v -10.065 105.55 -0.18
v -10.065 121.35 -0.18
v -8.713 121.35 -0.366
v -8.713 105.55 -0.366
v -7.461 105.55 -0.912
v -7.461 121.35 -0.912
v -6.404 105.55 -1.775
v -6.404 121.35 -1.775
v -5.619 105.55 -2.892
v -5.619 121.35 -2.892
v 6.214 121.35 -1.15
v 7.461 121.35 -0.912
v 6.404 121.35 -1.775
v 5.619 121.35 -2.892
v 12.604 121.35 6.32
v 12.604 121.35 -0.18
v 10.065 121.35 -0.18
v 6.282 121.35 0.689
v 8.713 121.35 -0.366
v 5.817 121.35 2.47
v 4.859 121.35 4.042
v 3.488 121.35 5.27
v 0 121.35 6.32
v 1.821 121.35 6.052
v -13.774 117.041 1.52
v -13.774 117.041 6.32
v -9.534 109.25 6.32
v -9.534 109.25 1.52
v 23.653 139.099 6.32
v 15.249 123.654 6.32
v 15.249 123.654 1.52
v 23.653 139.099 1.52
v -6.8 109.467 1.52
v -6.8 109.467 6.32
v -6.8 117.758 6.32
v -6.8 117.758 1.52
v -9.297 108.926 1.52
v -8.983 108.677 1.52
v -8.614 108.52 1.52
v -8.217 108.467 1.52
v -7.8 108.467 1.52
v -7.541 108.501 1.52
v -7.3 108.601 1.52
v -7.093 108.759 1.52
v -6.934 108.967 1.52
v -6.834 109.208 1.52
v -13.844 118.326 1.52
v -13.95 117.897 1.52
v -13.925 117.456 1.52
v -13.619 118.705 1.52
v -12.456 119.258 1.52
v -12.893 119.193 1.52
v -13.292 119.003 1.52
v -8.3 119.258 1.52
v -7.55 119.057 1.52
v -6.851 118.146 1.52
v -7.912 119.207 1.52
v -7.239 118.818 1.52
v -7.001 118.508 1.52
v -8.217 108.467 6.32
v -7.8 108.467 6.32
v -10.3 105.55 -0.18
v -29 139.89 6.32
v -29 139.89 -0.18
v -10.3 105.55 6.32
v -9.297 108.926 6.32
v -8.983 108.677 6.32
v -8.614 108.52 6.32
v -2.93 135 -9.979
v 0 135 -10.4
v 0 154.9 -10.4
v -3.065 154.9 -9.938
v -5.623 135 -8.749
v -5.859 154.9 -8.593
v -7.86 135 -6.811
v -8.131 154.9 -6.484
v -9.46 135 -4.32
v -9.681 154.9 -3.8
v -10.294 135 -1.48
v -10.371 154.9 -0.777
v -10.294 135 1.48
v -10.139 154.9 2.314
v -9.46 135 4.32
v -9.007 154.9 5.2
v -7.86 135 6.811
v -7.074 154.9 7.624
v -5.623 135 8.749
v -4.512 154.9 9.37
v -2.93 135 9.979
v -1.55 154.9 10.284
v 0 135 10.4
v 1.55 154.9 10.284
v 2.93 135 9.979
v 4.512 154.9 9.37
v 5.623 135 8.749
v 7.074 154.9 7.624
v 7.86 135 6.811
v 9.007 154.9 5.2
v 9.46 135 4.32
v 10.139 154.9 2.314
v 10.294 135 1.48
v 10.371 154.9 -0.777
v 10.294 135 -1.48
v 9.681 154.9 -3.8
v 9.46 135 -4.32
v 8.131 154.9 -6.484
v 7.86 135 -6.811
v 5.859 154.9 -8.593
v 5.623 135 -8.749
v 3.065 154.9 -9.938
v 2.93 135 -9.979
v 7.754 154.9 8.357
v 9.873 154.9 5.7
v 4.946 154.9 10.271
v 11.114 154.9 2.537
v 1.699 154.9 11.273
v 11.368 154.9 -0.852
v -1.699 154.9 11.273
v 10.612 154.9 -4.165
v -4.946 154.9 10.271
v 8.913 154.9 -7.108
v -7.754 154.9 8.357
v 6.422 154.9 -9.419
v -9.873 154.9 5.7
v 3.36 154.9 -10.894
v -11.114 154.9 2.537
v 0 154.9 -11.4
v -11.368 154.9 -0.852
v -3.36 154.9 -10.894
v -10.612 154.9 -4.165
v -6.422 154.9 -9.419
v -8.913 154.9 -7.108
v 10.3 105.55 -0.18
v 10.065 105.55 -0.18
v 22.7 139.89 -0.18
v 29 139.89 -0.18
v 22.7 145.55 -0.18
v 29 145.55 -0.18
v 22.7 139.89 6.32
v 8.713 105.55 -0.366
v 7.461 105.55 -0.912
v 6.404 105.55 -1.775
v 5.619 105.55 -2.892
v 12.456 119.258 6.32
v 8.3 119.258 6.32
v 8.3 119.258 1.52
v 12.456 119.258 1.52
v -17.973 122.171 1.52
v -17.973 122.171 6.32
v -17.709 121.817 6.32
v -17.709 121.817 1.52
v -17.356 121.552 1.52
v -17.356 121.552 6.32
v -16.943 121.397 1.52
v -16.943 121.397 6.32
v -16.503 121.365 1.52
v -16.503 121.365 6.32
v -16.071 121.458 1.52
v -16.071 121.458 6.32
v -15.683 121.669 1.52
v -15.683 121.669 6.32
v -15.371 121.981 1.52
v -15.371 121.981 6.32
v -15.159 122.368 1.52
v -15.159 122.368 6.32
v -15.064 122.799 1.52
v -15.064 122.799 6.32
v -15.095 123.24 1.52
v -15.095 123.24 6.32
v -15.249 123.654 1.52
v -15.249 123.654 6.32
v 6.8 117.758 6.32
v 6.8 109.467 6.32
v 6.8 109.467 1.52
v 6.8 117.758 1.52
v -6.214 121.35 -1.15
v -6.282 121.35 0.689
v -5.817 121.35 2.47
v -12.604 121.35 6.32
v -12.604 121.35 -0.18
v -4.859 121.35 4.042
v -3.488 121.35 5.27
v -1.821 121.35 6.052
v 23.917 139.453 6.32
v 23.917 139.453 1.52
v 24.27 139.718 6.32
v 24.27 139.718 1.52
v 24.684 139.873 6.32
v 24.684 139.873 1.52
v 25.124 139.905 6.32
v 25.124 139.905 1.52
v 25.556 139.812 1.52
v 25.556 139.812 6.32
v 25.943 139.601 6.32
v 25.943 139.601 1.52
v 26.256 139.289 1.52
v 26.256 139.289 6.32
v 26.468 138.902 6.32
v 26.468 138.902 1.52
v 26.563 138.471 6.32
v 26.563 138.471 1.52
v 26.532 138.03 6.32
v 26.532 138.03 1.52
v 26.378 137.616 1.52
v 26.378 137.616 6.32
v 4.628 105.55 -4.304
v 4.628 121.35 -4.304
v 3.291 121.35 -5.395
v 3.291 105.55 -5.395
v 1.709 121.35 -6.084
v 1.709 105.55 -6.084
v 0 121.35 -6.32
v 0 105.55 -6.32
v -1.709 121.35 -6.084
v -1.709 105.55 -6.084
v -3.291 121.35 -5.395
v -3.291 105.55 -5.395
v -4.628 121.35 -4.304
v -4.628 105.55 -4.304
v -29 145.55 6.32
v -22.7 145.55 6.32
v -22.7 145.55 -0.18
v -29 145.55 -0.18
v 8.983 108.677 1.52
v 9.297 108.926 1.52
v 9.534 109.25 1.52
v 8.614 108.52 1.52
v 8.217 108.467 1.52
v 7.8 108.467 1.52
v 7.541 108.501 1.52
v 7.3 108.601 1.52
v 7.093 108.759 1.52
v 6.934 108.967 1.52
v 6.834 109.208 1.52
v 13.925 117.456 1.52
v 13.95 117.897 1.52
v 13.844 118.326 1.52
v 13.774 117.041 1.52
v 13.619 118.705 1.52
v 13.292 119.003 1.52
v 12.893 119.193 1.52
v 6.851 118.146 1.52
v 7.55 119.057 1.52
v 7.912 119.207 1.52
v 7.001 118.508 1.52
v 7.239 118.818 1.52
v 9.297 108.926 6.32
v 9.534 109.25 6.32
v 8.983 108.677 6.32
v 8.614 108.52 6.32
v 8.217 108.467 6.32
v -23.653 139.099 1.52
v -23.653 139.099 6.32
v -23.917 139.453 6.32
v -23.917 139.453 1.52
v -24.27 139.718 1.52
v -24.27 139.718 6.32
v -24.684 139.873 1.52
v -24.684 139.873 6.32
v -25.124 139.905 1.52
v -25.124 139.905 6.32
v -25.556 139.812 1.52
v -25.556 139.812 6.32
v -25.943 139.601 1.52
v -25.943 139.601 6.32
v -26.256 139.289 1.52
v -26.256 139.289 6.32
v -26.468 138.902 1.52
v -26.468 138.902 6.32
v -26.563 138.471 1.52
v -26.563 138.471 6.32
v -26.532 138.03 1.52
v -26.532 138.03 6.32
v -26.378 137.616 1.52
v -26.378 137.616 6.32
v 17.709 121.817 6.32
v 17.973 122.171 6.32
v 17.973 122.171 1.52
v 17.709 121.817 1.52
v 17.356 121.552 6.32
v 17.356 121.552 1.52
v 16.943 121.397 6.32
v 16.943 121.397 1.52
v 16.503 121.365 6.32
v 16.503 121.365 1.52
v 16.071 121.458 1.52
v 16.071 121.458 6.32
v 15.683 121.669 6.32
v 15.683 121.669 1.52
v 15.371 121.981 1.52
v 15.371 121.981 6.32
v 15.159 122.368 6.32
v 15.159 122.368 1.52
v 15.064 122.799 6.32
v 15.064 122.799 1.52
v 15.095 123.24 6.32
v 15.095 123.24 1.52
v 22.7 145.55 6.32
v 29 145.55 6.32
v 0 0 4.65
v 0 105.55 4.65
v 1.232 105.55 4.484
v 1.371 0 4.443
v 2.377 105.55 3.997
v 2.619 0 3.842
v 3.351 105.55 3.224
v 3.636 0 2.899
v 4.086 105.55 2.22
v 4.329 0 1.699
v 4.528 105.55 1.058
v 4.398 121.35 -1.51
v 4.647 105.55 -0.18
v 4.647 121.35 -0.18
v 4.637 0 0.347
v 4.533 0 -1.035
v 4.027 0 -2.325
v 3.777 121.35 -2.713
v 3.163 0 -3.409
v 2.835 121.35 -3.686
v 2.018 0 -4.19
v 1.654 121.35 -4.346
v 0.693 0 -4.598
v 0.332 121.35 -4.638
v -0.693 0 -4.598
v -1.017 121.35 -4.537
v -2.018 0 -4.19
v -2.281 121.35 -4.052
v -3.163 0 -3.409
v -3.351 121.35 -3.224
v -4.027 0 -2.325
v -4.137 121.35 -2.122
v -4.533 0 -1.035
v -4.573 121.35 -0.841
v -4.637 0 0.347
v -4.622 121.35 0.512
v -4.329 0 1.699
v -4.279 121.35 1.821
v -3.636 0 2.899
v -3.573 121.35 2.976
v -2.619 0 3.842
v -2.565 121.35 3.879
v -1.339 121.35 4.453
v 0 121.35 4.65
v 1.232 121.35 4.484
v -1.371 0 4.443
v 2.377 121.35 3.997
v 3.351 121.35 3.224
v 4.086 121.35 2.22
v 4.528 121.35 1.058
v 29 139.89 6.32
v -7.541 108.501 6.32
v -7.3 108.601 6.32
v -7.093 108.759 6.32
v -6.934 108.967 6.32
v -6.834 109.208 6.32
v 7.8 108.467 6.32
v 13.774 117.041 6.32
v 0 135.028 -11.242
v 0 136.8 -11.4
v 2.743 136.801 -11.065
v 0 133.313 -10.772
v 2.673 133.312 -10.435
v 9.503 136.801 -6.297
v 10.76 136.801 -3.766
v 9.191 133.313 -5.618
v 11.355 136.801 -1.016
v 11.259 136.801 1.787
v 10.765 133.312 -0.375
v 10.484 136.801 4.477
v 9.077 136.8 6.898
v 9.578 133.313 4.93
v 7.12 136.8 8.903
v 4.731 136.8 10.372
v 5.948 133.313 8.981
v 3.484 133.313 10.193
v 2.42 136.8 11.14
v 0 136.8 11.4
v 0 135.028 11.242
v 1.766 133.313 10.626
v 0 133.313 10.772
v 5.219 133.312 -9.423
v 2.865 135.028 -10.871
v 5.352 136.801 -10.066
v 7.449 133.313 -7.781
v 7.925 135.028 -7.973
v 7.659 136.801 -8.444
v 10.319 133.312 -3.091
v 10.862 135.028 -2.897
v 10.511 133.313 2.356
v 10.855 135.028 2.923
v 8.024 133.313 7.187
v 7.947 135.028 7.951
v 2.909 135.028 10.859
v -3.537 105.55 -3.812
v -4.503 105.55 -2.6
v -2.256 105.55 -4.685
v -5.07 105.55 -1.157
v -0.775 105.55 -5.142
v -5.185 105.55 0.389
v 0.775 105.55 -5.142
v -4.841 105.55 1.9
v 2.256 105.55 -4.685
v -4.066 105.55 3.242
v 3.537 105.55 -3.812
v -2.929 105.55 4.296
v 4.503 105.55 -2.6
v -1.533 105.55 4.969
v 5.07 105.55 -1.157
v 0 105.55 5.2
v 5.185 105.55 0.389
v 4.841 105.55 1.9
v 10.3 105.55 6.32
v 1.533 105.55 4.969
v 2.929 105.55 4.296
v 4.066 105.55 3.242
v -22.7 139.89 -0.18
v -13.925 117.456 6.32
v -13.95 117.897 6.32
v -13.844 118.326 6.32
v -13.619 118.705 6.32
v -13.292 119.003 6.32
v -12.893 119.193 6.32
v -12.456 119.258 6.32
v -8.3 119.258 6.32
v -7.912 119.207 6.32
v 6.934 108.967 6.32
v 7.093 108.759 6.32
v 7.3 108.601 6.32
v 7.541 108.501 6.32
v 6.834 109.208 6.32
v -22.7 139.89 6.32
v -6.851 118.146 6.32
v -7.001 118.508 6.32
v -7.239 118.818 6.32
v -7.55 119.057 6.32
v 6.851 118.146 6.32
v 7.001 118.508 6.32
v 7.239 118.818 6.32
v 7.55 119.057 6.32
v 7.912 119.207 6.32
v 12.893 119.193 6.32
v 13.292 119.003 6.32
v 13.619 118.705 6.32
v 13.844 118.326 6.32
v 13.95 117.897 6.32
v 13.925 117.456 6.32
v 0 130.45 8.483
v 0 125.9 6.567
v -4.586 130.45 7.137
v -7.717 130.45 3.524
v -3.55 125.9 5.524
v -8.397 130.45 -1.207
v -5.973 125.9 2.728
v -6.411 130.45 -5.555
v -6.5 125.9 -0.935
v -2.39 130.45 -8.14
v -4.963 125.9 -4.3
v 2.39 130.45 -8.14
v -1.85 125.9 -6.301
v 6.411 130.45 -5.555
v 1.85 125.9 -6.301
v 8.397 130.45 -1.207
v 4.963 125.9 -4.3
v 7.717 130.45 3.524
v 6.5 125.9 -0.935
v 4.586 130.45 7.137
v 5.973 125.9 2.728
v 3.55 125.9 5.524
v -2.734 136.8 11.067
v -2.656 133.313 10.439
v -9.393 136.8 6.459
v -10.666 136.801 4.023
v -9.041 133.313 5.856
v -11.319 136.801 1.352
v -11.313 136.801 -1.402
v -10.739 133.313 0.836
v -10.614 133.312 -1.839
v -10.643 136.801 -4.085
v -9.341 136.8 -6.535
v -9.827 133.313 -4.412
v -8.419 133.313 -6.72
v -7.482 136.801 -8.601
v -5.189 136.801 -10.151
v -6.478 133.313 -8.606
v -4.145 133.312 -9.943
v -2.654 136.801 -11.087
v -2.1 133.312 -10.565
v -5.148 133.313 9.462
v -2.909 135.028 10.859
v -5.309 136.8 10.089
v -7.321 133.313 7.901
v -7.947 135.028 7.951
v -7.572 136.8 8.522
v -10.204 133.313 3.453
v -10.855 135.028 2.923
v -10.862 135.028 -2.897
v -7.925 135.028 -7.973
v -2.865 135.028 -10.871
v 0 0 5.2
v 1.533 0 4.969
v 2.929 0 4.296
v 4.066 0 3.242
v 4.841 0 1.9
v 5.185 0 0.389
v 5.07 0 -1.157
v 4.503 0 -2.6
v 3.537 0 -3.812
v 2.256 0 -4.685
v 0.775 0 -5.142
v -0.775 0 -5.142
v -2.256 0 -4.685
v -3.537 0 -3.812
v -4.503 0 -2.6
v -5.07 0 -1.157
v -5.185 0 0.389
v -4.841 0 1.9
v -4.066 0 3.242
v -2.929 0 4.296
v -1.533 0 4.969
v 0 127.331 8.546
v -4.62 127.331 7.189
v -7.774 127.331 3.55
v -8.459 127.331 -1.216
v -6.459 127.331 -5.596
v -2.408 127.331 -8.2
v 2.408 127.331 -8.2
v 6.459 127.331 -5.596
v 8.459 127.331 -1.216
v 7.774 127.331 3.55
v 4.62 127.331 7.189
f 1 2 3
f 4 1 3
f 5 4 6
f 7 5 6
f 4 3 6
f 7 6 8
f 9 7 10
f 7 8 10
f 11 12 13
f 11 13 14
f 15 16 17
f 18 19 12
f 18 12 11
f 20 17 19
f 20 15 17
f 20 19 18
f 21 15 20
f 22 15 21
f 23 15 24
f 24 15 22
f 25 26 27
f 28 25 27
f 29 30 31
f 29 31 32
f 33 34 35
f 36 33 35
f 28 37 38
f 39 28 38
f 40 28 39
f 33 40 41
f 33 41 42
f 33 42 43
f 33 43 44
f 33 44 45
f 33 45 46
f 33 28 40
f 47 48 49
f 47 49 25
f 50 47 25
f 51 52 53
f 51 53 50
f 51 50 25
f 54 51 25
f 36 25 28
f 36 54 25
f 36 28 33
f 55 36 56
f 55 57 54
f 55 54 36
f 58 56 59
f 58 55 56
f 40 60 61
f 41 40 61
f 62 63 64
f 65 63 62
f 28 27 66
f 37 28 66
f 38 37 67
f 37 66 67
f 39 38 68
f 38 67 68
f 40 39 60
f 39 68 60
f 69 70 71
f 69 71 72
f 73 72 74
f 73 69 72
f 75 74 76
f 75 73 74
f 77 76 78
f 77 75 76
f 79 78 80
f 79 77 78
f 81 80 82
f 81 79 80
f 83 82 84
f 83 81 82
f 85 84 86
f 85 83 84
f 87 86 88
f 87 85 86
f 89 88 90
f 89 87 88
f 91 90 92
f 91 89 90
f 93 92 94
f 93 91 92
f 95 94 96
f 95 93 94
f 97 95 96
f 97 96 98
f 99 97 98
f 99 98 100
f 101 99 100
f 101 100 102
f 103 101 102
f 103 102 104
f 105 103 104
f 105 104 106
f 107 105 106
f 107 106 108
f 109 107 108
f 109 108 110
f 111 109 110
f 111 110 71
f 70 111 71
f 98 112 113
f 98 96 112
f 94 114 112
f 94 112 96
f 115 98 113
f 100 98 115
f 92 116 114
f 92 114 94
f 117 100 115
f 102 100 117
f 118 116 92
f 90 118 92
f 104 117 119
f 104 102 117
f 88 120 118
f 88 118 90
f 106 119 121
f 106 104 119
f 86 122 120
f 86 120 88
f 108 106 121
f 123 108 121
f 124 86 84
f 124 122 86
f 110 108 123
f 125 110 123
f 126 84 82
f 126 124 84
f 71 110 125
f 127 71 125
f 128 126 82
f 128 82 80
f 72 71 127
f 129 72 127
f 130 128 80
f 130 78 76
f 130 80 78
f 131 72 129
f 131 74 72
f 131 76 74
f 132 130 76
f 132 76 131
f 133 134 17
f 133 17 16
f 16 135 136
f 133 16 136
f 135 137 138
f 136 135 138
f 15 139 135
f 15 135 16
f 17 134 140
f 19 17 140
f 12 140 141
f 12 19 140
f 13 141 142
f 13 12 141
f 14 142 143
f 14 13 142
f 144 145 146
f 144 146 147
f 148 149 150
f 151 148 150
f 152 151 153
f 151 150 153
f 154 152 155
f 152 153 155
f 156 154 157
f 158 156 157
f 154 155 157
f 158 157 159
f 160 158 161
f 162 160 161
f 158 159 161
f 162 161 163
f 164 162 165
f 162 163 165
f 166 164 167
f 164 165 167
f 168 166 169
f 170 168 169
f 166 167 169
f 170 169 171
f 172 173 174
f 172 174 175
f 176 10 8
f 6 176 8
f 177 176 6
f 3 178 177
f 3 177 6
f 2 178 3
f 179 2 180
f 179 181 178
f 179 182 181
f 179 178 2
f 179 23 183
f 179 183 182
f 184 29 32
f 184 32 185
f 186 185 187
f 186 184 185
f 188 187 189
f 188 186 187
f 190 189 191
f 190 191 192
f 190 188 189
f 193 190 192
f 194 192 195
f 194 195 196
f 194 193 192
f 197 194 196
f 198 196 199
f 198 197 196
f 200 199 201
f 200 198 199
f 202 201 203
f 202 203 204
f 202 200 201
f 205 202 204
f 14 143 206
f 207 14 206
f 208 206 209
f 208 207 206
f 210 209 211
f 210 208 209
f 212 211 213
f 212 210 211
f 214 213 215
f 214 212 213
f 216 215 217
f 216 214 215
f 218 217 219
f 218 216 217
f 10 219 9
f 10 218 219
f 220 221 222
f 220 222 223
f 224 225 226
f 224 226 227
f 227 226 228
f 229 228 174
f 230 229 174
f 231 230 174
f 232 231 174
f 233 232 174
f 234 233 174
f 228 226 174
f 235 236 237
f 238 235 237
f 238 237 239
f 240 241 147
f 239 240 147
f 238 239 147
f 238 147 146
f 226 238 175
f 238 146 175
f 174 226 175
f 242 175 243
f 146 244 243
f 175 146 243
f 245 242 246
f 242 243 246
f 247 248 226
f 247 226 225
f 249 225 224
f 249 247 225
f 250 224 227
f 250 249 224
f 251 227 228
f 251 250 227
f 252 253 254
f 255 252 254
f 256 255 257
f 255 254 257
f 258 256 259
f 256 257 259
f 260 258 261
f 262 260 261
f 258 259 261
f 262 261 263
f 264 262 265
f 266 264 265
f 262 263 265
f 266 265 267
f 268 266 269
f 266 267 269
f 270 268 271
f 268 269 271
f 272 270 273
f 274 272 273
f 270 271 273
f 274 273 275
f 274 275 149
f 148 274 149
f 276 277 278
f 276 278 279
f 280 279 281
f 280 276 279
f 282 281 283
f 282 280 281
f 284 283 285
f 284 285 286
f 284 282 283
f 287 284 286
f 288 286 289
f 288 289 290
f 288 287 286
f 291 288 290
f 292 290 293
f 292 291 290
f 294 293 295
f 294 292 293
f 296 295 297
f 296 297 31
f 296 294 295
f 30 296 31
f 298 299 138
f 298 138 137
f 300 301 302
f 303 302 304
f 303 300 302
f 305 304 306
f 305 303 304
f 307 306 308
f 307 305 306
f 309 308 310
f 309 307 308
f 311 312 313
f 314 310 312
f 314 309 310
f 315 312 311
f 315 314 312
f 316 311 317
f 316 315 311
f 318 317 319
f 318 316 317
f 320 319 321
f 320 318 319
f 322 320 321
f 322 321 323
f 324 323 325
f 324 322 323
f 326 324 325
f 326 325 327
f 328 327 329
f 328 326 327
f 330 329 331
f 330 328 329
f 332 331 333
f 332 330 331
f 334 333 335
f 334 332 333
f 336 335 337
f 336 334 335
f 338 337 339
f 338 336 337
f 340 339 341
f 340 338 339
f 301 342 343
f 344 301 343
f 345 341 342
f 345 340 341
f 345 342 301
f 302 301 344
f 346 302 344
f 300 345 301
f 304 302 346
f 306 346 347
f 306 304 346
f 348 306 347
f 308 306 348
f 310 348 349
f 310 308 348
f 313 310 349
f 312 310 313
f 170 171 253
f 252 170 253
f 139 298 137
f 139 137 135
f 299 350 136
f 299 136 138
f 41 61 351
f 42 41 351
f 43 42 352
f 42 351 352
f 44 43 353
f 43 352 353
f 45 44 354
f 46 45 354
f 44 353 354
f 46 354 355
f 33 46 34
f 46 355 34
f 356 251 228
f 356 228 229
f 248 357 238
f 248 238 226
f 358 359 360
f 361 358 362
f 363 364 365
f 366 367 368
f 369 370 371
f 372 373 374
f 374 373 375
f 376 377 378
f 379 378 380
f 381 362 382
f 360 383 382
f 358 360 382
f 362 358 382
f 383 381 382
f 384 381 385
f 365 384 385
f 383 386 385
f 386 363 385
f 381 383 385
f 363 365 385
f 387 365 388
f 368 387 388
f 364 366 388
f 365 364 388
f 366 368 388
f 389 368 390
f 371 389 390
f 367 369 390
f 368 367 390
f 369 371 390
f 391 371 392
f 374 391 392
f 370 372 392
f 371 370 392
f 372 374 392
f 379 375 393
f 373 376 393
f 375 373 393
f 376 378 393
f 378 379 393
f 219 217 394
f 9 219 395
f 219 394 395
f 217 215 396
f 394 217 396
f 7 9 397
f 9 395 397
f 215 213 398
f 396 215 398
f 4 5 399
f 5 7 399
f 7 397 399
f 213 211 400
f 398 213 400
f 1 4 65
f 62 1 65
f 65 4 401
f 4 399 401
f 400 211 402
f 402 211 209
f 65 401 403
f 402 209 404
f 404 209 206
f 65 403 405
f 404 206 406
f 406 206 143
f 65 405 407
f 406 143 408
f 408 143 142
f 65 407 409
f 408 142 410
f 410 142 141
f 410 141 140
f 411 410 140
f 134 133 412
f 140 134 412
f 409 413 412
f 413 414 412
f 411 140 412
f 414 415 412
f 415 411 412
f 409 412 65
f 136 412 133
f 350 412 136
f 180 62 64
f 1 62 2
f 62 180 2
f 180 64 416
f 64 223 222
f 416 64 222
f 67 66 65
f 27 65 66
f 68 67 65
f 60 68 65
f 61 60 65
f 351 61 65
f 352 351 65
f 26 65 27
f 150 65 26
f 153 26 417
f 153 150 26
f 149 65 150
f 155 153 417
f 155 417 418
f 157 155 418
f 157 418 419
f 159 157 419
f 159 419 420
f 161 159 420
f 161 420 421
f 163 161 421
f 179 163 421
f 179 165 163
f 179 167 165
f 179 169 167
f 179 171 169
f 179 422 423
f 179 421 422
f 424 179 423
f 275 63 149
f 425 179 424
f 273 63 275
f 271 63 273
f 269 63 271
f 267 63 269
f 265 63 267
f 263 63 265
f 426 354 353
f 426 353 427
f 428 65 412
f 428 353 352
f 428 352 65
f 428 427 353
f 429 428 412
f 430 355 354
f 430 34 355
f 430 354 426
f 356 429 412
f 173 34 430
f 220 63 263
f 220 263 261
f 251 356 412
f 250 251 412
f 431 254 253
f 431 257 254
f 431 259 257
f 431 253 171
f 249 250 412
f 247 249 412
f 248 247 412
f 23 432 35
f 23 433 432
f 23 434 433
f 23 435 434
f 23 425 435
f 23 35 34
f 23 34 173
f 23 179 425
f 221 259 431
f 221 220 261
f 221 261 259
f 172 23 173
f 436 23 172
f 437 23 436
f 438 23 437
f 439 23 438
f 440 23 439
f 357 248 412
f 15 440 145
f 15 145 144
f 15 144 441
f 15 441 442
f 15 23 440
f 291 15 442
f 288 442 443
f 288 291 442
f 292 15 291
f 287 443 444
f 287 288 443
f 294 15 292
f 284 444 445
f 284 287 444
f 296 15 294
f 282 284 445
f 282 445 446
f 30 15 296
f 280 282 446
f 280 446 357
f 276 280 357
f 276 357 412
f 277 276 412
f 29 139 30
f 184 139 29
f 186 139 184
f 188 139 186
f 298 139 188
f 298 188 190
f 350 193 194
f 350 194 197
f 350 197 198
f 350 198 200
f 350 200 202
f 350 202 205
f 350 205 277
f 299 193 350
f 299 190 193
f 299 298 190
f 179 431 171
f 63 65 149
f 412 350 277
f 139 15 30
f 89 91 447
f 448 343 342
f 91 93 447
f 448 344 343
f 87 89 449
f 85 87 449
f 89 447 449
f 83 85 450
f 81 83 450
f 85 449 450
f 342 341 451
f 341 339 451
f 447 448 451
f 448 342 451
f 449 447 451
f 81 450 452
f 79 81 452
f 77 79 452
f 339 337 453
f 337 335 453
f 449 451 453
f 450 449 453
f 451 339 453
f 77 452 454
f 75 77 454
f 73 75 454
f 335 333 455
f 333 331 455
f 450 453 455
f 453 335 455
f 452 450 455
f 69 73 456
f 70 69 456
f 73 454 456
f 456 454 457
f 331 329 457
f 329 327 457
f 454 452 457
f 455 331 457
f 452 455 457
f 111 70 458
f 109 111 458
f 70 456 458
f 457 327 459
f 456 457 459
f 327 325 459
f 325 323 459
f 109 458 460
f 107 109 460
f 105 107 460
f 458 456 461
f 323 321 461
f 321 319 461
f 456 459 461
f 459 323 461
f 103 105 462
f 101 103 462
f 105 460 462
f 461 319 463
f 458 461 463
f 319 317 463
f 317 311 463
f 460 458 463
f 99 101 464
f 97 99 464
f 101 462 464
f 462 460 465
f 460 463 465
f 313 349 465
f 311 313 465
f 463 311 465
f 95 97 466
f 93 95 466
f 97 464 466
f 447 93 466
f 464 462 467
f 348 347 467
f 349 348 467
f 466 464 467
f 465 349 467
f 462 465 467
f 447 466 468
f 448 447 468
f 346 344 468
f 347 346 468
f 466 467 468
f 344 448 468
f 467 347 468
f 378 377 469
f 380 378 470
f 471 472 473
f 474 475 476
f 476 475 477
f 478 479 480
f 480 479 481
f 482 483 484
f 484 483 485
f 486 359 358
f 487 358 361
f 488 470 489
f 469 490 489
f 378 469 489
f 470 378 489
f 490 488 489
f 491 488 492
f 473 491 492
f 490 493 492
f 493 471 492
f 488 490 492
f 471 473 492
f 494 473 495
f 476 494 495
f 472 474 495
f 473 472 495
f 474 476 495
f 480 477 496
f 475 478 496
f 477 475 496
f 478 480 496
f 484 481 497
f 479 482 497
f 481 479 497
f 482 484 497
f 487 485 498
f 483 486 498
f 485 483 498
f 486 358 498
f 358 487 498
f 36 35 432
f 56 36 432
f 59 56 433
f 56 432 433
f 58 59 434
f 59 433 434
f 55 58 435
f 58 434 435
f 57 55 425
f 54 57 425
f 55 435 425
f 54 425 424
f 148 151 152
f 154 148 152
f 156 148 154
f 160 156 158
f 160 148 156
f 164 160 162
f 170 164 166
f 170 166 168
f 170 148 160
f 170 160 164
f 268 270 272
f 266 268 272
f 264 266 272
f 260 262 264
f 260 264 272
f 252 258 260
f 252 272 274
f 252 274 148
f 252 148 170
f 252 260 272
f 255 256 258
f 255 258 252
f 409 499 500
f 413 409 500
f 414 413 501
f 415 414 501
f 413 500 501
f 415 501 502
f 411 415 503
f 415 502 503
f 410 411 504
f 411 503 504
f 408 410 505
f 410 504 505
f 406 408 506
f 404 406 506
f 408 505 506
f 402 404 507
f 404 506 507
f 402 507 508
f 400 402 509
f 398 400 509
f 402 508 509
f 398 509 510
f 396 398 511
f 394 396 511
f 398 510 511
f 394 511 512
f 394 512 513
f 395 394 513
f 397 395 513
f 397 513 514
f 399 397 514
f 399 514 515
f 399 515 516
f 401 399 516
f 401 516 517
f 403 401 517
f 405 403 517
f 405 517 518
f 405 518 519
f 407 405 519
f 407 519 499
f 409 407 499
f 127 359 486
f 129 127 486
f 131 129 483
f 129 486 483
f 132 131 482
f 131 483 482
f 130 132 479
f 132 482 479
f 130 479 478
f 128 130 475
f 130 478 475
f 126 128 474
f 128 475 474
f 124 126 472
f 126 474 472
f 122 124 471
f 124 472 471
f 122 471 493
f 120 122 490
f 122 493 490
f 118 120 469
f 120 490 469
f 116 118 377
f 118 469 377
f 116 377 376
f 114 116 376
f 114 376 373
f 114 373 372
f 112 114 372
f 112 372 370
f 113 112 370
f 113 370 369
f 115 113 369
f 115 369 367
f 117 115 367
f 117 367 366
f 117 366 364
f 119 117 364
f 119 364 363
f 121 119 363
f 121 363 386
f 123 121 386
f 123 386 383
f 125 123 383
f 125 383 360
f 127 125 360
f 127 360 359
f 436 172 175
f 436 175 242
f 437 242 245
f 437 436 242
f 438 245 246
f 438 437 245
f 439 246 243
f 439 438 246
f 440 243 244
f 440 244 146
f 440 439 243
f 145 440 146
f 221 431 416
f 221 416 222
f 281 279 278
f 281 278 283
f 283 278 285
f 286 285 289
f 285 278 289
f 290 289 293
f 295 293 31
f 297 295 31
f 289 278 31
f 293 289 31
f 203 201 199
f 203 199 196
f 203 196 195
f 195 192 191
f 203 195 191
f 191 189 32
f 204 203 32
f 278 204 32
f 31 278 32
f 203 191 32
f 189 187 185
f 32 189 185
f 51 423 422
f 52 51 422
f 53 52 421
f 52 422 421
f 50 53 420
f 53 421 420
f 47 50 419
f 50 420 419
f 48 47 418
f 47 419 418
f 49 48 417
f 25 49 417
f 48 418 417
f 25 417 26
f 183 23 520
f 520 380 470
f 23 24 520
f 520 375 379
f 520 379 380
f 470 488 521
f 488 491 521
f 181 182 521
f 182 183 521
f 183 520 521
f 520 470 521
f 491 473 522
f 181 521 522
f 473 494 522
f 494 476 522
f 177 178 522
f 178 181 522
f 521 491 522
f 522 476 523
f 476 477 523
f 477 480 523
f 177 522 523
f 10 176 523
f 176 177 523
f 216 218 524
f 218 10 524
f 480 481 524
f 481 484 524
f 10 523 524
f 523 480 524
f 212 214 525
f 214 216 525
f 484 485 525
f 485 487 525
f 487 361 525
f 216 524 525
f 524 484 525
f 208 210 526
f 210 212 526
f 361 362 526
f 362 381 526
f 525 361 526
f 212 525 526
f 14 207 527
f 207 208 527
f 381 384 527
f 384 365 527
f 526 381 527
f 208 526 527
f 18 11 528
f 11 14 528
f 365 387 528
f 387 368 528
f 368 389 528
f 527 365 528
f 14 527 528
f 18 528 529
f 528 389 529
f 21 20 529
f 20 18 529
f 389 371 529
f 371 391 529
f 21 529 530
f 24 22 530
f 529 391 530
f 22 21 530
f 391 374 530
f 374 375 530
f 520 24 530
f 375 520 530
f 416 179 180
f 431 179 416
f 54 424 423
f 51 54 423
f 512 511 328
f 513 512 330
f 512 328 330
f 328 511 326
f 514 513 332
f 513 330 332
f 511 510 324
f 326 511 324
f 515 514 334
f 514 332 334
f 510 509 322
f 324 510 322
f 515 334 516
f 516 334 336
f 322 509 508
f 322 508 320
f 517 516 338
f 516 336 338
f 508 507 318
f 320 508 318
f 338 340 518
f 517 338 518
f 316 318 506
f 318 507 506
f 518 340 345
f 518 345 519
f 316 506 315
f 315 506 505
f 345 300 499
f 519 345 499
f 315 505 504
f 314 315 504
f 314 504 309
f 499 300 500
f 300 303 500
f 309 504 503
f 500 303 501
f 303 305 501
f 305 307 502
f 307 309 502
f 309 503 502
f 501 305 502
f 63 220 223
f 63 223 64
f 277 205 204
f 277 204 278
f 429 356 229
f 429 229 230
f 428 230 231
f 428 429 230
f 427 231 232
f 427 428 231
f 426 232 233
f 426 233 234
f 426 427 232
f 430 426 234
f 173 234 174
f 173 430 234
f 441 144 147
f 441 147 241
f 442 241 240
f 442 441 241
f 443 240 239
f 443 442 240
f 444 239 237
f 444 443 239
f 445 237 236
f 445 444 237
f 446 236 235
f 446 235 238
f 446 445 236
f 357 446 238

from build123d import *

# Parameters (mm, degrees)
SKETCH1_R               = 5.2
SKETCH1_R_2             = 4.65
BOSS_EXTRUDE1_DEPTH     = 121.35
SKETCH2_R               = 6.32
SKETCH2_R_2             = 4.65
BOSS_EXTRUDE2_DEPTH     = 15.8
SKETCH4_R               = 11.4
SKETCH4_R_2             = 10.4
BOSS_EXTRUDE3_DEPTH     = 19.9
BOSS_EXTRUDE4_DEPTH     = 6.5
CUT_EXTRUDE1_DEPTH      = 4.8
FILLET2_R               = 10
SKETCH8_R               = 4.65
CUT_EXTRUDE2_DEPTH      = 159.003069696
CUT_EXTRUDE2_DEPTH_BACK = 159.003069696
FILLET3_R               = 5
FILLET4_R               = 5


with BuildPart() as part:
    # Sketch1 → Boss-Extrude1 (new body)
    with BuildSketch(Plane(origin=(0, 0, 0), x_dir=(1, 0, 0), z_dir=(0, 1, 0))):
        with Locations(Location((0, 0, 0), (0, 0, 270))):
            Circle(SKETCH1_R)
        with Locations(Location((0, 0, 0), (0, 0, 270))):
            Circle(SKETCH1_R_2, mode=Mode.SUBTRACT)
    extrude(amount=BOSS_EXTRUDE1_DEPTH)

    # Sketch2 → Boss-Extrude2 (add)
    with BuildSketch(Plane(origin=(0, 121.35, 0), x_dir=(1, 0, 0), z_dir=(0, 1, 0))):
        with Locations(Location((0, 0, 0), (0, 0, 270))):
            Circle(SKETCH2_R)
        with Locations(Location((0, 0, 0), (0, 0, 270))):
            Circle(SKETCH2_R_2, mode=Mode.SUBTRACT)
    extrude(amount=-BOSS_EXTRUDE2_DEPTH)

    # Sketch3 → Revolve1 (revolve)
    with BuildSketch(Plane.XY, mode=Mode.PRIVATE) as revolve1_sk:
        Polygon((-6.32, 121.35), (-11.4, 135), (-10.4, 135), (-4.65, 121.35), align=None)
    revolve(revolve1_sk.sketch.rotate(Axis((0, 121.35, 0), (0, -1, 0)), 270), axis=Axis((0, 121.35, 0), (0, -1, 0)))

    # Sketch4 → Boss-Extrude3 (add)
    with BuildSketch(Plane(origin=(0, 135, 0), x_dir=(1, 0, 0), z_dir=(0, 1, 0))):
        with Locations(Location((0, 0, 0), (0, 0, 90))):
            Circle(SKETCH4_R)
        with Locations(Location((0, 0, 0), (0, 0, 90))):
            Circle(SKETCH4_R_2, mode=Mode.SUBTRACT)
    extrude(amount=BOSS_EXTRUDE3_DEPTH)

    # Fillet2
    fillet2_edges = [part.edges().sort_by_distance(p)[0] for p in [
        (-11.4, 135, 0),
    ]]
    fillet(fillet2_edges, radius=FILLET2_R)


with BuildPart() as body_2:
    # Sketch6 → Boss-Extrude4 (new body)
    with BuildSketch(Plane.XY.offset(6.32)):
        Polygon((-10.3, 105.55), (10.3, 105.55), (29, 139.89), (29, 145.55), (22.7, 145.55), (22.7, 139.89), (12.603960396, 121.35), (-12.603960396, 121.35), (-22.7, 139.89), (-22.7, 145.55), (-29, 145.55), (-29, 139.89), align=None)
    extrude(amount=-BOSS_EXTRUDE4_DEPTH)

    # Sketch7 → Cut-Extrude1 (cut)
    with BuildSketch(Plane.XY.offset(6.32)):
        with BuildLine():
            Line((8.3, 119.257622479), (12.456070352, 119.257622479))
            ThreePointArc((12.456070352, 119.257622479), (13.745534607, 118.523965702), (13.773633276, 117.04066506))
            Line((13.773633276, 117.04066506), (9.534103268, 109.249619999))
            ThreePointArc((9.534103268, 109.249619999), (8.982883567, 108.677113163), (8.216540343, 108.466577418))
            Line((8.216540343, 108.466577418), (7.8, 108.466577418))
            ThreePointArc((7.8, 108.466577418), (7.092893219, 108.759470637), (6.8, 109.466577418))
            Line((6.8, 109.466577418), (6.8, 117.757622479))
            ThreePointArc((6.8, 117.757622479), (7.239339828, 118.81828265), (8.3, 119.257622479))
        make_face()
        with BuildLine():
            Line((-15.248616144, 123.653554953), (-23.653367428, 139.099086851))
            ThreePointArc((-23.653367428, 139.099086851), (-25.757025654, 139.720102373), (-26.378041176, 137.616444147))
            Line((-26.378041176, 137.616444147), (-17.973289892, 122.170912249))
            ThreePointArc((-17.973289892, 122.170912249), (-15.869631666, 121.549896727), (-15.248616144, 123.653554953))
        make_face()
        with BuildLine():
            Line((15.248616144, 123.653554953), (23.653367428, 139.099086851))
            ThreePointArc((23.653367428, 139.099086851), (25.757025654, 139.720102373), (26.378041176, 137.616444147))
            Line((26.378041176, 137.616444147), (17.973289892, 122.170912249))
            ThreePointArc((17.973289892, 122.170912249), (15.869631666, 121.549896727), (15.248616144, 123.653554953))
        make_face()
        with BuildLine():
            Line((-8.216540343, 108.466577418), (-7.8, 108.466577418))
            ThreePointArc((-7.8, 108.466577418), (-7.092893219, 108.759470637), (-6.8, 109.466577418))
            Line((-6.8, 109.466577418), (-6.8, 117.757622479))
            ThreePointArc((-6.8, 117.757622479), (-7.239339828, 118.81828265), (-8.3, 119.257622479))
            Line((-8.3, 119.257622479), (-12.456070352, 119.257622479))
            ThreePointArc((-12.456070352, 119.257622479), (-13.745534607, 118.523965702), (-13.773633276, 117.04066506))
            Line((-13.773633276, 117.04066506), (-9.534103268, 109.249619999))
            ThreePointArc((-9.534103268, 109.249619999), (-8.982883567, 108.677113163), (-8.216540343, 108.466577418))
        make_face()
    extrude(amount=-CUT_EXTRUDE1_DEPTH, mode=Mode.SUBTRACT)

    # Sketch8 → Cut-Extrude2 (cut, two sides)
    with BuildSketch(Plane(origin=(0, 0, 0), x_dir=(1, 0, 0), z_dir=(0, 1, 0))) as cut_extrude2_sk:
        with Locations(Location((0, 0, 0), (0, 0, 270))):
            Circle(SKETCH8_R)
    extrude(amount=CUT_EXTRUDE2_DEPTH, mode=Mode.SUBTRACT)
    extrude(cut_extrude2_sk.sketch, amount=-CUT_EXTRUDE2_DEPTH_BACK, mode=Mode.SUBTRACT)

    # Combine1: union part
    add(part.part)

    # Fillet3
    fillet3_edges = [body_2.edges().sort_by_distance(p)[0] for p in [
        (-6.317436189, 113.45, -0.18),
    ]]
    fillet(fillet3_edges, radius=FILLET3_R)

    # Fillet4
    fillet4_edges = [body_2.edges().sort_by_distance(p)[0] for p in [
        (6.317436189, 113.45, -0.18),
    ]]
    fillet(fillet4_edges, radius=FILLET4_R)


solid = body_2.part
